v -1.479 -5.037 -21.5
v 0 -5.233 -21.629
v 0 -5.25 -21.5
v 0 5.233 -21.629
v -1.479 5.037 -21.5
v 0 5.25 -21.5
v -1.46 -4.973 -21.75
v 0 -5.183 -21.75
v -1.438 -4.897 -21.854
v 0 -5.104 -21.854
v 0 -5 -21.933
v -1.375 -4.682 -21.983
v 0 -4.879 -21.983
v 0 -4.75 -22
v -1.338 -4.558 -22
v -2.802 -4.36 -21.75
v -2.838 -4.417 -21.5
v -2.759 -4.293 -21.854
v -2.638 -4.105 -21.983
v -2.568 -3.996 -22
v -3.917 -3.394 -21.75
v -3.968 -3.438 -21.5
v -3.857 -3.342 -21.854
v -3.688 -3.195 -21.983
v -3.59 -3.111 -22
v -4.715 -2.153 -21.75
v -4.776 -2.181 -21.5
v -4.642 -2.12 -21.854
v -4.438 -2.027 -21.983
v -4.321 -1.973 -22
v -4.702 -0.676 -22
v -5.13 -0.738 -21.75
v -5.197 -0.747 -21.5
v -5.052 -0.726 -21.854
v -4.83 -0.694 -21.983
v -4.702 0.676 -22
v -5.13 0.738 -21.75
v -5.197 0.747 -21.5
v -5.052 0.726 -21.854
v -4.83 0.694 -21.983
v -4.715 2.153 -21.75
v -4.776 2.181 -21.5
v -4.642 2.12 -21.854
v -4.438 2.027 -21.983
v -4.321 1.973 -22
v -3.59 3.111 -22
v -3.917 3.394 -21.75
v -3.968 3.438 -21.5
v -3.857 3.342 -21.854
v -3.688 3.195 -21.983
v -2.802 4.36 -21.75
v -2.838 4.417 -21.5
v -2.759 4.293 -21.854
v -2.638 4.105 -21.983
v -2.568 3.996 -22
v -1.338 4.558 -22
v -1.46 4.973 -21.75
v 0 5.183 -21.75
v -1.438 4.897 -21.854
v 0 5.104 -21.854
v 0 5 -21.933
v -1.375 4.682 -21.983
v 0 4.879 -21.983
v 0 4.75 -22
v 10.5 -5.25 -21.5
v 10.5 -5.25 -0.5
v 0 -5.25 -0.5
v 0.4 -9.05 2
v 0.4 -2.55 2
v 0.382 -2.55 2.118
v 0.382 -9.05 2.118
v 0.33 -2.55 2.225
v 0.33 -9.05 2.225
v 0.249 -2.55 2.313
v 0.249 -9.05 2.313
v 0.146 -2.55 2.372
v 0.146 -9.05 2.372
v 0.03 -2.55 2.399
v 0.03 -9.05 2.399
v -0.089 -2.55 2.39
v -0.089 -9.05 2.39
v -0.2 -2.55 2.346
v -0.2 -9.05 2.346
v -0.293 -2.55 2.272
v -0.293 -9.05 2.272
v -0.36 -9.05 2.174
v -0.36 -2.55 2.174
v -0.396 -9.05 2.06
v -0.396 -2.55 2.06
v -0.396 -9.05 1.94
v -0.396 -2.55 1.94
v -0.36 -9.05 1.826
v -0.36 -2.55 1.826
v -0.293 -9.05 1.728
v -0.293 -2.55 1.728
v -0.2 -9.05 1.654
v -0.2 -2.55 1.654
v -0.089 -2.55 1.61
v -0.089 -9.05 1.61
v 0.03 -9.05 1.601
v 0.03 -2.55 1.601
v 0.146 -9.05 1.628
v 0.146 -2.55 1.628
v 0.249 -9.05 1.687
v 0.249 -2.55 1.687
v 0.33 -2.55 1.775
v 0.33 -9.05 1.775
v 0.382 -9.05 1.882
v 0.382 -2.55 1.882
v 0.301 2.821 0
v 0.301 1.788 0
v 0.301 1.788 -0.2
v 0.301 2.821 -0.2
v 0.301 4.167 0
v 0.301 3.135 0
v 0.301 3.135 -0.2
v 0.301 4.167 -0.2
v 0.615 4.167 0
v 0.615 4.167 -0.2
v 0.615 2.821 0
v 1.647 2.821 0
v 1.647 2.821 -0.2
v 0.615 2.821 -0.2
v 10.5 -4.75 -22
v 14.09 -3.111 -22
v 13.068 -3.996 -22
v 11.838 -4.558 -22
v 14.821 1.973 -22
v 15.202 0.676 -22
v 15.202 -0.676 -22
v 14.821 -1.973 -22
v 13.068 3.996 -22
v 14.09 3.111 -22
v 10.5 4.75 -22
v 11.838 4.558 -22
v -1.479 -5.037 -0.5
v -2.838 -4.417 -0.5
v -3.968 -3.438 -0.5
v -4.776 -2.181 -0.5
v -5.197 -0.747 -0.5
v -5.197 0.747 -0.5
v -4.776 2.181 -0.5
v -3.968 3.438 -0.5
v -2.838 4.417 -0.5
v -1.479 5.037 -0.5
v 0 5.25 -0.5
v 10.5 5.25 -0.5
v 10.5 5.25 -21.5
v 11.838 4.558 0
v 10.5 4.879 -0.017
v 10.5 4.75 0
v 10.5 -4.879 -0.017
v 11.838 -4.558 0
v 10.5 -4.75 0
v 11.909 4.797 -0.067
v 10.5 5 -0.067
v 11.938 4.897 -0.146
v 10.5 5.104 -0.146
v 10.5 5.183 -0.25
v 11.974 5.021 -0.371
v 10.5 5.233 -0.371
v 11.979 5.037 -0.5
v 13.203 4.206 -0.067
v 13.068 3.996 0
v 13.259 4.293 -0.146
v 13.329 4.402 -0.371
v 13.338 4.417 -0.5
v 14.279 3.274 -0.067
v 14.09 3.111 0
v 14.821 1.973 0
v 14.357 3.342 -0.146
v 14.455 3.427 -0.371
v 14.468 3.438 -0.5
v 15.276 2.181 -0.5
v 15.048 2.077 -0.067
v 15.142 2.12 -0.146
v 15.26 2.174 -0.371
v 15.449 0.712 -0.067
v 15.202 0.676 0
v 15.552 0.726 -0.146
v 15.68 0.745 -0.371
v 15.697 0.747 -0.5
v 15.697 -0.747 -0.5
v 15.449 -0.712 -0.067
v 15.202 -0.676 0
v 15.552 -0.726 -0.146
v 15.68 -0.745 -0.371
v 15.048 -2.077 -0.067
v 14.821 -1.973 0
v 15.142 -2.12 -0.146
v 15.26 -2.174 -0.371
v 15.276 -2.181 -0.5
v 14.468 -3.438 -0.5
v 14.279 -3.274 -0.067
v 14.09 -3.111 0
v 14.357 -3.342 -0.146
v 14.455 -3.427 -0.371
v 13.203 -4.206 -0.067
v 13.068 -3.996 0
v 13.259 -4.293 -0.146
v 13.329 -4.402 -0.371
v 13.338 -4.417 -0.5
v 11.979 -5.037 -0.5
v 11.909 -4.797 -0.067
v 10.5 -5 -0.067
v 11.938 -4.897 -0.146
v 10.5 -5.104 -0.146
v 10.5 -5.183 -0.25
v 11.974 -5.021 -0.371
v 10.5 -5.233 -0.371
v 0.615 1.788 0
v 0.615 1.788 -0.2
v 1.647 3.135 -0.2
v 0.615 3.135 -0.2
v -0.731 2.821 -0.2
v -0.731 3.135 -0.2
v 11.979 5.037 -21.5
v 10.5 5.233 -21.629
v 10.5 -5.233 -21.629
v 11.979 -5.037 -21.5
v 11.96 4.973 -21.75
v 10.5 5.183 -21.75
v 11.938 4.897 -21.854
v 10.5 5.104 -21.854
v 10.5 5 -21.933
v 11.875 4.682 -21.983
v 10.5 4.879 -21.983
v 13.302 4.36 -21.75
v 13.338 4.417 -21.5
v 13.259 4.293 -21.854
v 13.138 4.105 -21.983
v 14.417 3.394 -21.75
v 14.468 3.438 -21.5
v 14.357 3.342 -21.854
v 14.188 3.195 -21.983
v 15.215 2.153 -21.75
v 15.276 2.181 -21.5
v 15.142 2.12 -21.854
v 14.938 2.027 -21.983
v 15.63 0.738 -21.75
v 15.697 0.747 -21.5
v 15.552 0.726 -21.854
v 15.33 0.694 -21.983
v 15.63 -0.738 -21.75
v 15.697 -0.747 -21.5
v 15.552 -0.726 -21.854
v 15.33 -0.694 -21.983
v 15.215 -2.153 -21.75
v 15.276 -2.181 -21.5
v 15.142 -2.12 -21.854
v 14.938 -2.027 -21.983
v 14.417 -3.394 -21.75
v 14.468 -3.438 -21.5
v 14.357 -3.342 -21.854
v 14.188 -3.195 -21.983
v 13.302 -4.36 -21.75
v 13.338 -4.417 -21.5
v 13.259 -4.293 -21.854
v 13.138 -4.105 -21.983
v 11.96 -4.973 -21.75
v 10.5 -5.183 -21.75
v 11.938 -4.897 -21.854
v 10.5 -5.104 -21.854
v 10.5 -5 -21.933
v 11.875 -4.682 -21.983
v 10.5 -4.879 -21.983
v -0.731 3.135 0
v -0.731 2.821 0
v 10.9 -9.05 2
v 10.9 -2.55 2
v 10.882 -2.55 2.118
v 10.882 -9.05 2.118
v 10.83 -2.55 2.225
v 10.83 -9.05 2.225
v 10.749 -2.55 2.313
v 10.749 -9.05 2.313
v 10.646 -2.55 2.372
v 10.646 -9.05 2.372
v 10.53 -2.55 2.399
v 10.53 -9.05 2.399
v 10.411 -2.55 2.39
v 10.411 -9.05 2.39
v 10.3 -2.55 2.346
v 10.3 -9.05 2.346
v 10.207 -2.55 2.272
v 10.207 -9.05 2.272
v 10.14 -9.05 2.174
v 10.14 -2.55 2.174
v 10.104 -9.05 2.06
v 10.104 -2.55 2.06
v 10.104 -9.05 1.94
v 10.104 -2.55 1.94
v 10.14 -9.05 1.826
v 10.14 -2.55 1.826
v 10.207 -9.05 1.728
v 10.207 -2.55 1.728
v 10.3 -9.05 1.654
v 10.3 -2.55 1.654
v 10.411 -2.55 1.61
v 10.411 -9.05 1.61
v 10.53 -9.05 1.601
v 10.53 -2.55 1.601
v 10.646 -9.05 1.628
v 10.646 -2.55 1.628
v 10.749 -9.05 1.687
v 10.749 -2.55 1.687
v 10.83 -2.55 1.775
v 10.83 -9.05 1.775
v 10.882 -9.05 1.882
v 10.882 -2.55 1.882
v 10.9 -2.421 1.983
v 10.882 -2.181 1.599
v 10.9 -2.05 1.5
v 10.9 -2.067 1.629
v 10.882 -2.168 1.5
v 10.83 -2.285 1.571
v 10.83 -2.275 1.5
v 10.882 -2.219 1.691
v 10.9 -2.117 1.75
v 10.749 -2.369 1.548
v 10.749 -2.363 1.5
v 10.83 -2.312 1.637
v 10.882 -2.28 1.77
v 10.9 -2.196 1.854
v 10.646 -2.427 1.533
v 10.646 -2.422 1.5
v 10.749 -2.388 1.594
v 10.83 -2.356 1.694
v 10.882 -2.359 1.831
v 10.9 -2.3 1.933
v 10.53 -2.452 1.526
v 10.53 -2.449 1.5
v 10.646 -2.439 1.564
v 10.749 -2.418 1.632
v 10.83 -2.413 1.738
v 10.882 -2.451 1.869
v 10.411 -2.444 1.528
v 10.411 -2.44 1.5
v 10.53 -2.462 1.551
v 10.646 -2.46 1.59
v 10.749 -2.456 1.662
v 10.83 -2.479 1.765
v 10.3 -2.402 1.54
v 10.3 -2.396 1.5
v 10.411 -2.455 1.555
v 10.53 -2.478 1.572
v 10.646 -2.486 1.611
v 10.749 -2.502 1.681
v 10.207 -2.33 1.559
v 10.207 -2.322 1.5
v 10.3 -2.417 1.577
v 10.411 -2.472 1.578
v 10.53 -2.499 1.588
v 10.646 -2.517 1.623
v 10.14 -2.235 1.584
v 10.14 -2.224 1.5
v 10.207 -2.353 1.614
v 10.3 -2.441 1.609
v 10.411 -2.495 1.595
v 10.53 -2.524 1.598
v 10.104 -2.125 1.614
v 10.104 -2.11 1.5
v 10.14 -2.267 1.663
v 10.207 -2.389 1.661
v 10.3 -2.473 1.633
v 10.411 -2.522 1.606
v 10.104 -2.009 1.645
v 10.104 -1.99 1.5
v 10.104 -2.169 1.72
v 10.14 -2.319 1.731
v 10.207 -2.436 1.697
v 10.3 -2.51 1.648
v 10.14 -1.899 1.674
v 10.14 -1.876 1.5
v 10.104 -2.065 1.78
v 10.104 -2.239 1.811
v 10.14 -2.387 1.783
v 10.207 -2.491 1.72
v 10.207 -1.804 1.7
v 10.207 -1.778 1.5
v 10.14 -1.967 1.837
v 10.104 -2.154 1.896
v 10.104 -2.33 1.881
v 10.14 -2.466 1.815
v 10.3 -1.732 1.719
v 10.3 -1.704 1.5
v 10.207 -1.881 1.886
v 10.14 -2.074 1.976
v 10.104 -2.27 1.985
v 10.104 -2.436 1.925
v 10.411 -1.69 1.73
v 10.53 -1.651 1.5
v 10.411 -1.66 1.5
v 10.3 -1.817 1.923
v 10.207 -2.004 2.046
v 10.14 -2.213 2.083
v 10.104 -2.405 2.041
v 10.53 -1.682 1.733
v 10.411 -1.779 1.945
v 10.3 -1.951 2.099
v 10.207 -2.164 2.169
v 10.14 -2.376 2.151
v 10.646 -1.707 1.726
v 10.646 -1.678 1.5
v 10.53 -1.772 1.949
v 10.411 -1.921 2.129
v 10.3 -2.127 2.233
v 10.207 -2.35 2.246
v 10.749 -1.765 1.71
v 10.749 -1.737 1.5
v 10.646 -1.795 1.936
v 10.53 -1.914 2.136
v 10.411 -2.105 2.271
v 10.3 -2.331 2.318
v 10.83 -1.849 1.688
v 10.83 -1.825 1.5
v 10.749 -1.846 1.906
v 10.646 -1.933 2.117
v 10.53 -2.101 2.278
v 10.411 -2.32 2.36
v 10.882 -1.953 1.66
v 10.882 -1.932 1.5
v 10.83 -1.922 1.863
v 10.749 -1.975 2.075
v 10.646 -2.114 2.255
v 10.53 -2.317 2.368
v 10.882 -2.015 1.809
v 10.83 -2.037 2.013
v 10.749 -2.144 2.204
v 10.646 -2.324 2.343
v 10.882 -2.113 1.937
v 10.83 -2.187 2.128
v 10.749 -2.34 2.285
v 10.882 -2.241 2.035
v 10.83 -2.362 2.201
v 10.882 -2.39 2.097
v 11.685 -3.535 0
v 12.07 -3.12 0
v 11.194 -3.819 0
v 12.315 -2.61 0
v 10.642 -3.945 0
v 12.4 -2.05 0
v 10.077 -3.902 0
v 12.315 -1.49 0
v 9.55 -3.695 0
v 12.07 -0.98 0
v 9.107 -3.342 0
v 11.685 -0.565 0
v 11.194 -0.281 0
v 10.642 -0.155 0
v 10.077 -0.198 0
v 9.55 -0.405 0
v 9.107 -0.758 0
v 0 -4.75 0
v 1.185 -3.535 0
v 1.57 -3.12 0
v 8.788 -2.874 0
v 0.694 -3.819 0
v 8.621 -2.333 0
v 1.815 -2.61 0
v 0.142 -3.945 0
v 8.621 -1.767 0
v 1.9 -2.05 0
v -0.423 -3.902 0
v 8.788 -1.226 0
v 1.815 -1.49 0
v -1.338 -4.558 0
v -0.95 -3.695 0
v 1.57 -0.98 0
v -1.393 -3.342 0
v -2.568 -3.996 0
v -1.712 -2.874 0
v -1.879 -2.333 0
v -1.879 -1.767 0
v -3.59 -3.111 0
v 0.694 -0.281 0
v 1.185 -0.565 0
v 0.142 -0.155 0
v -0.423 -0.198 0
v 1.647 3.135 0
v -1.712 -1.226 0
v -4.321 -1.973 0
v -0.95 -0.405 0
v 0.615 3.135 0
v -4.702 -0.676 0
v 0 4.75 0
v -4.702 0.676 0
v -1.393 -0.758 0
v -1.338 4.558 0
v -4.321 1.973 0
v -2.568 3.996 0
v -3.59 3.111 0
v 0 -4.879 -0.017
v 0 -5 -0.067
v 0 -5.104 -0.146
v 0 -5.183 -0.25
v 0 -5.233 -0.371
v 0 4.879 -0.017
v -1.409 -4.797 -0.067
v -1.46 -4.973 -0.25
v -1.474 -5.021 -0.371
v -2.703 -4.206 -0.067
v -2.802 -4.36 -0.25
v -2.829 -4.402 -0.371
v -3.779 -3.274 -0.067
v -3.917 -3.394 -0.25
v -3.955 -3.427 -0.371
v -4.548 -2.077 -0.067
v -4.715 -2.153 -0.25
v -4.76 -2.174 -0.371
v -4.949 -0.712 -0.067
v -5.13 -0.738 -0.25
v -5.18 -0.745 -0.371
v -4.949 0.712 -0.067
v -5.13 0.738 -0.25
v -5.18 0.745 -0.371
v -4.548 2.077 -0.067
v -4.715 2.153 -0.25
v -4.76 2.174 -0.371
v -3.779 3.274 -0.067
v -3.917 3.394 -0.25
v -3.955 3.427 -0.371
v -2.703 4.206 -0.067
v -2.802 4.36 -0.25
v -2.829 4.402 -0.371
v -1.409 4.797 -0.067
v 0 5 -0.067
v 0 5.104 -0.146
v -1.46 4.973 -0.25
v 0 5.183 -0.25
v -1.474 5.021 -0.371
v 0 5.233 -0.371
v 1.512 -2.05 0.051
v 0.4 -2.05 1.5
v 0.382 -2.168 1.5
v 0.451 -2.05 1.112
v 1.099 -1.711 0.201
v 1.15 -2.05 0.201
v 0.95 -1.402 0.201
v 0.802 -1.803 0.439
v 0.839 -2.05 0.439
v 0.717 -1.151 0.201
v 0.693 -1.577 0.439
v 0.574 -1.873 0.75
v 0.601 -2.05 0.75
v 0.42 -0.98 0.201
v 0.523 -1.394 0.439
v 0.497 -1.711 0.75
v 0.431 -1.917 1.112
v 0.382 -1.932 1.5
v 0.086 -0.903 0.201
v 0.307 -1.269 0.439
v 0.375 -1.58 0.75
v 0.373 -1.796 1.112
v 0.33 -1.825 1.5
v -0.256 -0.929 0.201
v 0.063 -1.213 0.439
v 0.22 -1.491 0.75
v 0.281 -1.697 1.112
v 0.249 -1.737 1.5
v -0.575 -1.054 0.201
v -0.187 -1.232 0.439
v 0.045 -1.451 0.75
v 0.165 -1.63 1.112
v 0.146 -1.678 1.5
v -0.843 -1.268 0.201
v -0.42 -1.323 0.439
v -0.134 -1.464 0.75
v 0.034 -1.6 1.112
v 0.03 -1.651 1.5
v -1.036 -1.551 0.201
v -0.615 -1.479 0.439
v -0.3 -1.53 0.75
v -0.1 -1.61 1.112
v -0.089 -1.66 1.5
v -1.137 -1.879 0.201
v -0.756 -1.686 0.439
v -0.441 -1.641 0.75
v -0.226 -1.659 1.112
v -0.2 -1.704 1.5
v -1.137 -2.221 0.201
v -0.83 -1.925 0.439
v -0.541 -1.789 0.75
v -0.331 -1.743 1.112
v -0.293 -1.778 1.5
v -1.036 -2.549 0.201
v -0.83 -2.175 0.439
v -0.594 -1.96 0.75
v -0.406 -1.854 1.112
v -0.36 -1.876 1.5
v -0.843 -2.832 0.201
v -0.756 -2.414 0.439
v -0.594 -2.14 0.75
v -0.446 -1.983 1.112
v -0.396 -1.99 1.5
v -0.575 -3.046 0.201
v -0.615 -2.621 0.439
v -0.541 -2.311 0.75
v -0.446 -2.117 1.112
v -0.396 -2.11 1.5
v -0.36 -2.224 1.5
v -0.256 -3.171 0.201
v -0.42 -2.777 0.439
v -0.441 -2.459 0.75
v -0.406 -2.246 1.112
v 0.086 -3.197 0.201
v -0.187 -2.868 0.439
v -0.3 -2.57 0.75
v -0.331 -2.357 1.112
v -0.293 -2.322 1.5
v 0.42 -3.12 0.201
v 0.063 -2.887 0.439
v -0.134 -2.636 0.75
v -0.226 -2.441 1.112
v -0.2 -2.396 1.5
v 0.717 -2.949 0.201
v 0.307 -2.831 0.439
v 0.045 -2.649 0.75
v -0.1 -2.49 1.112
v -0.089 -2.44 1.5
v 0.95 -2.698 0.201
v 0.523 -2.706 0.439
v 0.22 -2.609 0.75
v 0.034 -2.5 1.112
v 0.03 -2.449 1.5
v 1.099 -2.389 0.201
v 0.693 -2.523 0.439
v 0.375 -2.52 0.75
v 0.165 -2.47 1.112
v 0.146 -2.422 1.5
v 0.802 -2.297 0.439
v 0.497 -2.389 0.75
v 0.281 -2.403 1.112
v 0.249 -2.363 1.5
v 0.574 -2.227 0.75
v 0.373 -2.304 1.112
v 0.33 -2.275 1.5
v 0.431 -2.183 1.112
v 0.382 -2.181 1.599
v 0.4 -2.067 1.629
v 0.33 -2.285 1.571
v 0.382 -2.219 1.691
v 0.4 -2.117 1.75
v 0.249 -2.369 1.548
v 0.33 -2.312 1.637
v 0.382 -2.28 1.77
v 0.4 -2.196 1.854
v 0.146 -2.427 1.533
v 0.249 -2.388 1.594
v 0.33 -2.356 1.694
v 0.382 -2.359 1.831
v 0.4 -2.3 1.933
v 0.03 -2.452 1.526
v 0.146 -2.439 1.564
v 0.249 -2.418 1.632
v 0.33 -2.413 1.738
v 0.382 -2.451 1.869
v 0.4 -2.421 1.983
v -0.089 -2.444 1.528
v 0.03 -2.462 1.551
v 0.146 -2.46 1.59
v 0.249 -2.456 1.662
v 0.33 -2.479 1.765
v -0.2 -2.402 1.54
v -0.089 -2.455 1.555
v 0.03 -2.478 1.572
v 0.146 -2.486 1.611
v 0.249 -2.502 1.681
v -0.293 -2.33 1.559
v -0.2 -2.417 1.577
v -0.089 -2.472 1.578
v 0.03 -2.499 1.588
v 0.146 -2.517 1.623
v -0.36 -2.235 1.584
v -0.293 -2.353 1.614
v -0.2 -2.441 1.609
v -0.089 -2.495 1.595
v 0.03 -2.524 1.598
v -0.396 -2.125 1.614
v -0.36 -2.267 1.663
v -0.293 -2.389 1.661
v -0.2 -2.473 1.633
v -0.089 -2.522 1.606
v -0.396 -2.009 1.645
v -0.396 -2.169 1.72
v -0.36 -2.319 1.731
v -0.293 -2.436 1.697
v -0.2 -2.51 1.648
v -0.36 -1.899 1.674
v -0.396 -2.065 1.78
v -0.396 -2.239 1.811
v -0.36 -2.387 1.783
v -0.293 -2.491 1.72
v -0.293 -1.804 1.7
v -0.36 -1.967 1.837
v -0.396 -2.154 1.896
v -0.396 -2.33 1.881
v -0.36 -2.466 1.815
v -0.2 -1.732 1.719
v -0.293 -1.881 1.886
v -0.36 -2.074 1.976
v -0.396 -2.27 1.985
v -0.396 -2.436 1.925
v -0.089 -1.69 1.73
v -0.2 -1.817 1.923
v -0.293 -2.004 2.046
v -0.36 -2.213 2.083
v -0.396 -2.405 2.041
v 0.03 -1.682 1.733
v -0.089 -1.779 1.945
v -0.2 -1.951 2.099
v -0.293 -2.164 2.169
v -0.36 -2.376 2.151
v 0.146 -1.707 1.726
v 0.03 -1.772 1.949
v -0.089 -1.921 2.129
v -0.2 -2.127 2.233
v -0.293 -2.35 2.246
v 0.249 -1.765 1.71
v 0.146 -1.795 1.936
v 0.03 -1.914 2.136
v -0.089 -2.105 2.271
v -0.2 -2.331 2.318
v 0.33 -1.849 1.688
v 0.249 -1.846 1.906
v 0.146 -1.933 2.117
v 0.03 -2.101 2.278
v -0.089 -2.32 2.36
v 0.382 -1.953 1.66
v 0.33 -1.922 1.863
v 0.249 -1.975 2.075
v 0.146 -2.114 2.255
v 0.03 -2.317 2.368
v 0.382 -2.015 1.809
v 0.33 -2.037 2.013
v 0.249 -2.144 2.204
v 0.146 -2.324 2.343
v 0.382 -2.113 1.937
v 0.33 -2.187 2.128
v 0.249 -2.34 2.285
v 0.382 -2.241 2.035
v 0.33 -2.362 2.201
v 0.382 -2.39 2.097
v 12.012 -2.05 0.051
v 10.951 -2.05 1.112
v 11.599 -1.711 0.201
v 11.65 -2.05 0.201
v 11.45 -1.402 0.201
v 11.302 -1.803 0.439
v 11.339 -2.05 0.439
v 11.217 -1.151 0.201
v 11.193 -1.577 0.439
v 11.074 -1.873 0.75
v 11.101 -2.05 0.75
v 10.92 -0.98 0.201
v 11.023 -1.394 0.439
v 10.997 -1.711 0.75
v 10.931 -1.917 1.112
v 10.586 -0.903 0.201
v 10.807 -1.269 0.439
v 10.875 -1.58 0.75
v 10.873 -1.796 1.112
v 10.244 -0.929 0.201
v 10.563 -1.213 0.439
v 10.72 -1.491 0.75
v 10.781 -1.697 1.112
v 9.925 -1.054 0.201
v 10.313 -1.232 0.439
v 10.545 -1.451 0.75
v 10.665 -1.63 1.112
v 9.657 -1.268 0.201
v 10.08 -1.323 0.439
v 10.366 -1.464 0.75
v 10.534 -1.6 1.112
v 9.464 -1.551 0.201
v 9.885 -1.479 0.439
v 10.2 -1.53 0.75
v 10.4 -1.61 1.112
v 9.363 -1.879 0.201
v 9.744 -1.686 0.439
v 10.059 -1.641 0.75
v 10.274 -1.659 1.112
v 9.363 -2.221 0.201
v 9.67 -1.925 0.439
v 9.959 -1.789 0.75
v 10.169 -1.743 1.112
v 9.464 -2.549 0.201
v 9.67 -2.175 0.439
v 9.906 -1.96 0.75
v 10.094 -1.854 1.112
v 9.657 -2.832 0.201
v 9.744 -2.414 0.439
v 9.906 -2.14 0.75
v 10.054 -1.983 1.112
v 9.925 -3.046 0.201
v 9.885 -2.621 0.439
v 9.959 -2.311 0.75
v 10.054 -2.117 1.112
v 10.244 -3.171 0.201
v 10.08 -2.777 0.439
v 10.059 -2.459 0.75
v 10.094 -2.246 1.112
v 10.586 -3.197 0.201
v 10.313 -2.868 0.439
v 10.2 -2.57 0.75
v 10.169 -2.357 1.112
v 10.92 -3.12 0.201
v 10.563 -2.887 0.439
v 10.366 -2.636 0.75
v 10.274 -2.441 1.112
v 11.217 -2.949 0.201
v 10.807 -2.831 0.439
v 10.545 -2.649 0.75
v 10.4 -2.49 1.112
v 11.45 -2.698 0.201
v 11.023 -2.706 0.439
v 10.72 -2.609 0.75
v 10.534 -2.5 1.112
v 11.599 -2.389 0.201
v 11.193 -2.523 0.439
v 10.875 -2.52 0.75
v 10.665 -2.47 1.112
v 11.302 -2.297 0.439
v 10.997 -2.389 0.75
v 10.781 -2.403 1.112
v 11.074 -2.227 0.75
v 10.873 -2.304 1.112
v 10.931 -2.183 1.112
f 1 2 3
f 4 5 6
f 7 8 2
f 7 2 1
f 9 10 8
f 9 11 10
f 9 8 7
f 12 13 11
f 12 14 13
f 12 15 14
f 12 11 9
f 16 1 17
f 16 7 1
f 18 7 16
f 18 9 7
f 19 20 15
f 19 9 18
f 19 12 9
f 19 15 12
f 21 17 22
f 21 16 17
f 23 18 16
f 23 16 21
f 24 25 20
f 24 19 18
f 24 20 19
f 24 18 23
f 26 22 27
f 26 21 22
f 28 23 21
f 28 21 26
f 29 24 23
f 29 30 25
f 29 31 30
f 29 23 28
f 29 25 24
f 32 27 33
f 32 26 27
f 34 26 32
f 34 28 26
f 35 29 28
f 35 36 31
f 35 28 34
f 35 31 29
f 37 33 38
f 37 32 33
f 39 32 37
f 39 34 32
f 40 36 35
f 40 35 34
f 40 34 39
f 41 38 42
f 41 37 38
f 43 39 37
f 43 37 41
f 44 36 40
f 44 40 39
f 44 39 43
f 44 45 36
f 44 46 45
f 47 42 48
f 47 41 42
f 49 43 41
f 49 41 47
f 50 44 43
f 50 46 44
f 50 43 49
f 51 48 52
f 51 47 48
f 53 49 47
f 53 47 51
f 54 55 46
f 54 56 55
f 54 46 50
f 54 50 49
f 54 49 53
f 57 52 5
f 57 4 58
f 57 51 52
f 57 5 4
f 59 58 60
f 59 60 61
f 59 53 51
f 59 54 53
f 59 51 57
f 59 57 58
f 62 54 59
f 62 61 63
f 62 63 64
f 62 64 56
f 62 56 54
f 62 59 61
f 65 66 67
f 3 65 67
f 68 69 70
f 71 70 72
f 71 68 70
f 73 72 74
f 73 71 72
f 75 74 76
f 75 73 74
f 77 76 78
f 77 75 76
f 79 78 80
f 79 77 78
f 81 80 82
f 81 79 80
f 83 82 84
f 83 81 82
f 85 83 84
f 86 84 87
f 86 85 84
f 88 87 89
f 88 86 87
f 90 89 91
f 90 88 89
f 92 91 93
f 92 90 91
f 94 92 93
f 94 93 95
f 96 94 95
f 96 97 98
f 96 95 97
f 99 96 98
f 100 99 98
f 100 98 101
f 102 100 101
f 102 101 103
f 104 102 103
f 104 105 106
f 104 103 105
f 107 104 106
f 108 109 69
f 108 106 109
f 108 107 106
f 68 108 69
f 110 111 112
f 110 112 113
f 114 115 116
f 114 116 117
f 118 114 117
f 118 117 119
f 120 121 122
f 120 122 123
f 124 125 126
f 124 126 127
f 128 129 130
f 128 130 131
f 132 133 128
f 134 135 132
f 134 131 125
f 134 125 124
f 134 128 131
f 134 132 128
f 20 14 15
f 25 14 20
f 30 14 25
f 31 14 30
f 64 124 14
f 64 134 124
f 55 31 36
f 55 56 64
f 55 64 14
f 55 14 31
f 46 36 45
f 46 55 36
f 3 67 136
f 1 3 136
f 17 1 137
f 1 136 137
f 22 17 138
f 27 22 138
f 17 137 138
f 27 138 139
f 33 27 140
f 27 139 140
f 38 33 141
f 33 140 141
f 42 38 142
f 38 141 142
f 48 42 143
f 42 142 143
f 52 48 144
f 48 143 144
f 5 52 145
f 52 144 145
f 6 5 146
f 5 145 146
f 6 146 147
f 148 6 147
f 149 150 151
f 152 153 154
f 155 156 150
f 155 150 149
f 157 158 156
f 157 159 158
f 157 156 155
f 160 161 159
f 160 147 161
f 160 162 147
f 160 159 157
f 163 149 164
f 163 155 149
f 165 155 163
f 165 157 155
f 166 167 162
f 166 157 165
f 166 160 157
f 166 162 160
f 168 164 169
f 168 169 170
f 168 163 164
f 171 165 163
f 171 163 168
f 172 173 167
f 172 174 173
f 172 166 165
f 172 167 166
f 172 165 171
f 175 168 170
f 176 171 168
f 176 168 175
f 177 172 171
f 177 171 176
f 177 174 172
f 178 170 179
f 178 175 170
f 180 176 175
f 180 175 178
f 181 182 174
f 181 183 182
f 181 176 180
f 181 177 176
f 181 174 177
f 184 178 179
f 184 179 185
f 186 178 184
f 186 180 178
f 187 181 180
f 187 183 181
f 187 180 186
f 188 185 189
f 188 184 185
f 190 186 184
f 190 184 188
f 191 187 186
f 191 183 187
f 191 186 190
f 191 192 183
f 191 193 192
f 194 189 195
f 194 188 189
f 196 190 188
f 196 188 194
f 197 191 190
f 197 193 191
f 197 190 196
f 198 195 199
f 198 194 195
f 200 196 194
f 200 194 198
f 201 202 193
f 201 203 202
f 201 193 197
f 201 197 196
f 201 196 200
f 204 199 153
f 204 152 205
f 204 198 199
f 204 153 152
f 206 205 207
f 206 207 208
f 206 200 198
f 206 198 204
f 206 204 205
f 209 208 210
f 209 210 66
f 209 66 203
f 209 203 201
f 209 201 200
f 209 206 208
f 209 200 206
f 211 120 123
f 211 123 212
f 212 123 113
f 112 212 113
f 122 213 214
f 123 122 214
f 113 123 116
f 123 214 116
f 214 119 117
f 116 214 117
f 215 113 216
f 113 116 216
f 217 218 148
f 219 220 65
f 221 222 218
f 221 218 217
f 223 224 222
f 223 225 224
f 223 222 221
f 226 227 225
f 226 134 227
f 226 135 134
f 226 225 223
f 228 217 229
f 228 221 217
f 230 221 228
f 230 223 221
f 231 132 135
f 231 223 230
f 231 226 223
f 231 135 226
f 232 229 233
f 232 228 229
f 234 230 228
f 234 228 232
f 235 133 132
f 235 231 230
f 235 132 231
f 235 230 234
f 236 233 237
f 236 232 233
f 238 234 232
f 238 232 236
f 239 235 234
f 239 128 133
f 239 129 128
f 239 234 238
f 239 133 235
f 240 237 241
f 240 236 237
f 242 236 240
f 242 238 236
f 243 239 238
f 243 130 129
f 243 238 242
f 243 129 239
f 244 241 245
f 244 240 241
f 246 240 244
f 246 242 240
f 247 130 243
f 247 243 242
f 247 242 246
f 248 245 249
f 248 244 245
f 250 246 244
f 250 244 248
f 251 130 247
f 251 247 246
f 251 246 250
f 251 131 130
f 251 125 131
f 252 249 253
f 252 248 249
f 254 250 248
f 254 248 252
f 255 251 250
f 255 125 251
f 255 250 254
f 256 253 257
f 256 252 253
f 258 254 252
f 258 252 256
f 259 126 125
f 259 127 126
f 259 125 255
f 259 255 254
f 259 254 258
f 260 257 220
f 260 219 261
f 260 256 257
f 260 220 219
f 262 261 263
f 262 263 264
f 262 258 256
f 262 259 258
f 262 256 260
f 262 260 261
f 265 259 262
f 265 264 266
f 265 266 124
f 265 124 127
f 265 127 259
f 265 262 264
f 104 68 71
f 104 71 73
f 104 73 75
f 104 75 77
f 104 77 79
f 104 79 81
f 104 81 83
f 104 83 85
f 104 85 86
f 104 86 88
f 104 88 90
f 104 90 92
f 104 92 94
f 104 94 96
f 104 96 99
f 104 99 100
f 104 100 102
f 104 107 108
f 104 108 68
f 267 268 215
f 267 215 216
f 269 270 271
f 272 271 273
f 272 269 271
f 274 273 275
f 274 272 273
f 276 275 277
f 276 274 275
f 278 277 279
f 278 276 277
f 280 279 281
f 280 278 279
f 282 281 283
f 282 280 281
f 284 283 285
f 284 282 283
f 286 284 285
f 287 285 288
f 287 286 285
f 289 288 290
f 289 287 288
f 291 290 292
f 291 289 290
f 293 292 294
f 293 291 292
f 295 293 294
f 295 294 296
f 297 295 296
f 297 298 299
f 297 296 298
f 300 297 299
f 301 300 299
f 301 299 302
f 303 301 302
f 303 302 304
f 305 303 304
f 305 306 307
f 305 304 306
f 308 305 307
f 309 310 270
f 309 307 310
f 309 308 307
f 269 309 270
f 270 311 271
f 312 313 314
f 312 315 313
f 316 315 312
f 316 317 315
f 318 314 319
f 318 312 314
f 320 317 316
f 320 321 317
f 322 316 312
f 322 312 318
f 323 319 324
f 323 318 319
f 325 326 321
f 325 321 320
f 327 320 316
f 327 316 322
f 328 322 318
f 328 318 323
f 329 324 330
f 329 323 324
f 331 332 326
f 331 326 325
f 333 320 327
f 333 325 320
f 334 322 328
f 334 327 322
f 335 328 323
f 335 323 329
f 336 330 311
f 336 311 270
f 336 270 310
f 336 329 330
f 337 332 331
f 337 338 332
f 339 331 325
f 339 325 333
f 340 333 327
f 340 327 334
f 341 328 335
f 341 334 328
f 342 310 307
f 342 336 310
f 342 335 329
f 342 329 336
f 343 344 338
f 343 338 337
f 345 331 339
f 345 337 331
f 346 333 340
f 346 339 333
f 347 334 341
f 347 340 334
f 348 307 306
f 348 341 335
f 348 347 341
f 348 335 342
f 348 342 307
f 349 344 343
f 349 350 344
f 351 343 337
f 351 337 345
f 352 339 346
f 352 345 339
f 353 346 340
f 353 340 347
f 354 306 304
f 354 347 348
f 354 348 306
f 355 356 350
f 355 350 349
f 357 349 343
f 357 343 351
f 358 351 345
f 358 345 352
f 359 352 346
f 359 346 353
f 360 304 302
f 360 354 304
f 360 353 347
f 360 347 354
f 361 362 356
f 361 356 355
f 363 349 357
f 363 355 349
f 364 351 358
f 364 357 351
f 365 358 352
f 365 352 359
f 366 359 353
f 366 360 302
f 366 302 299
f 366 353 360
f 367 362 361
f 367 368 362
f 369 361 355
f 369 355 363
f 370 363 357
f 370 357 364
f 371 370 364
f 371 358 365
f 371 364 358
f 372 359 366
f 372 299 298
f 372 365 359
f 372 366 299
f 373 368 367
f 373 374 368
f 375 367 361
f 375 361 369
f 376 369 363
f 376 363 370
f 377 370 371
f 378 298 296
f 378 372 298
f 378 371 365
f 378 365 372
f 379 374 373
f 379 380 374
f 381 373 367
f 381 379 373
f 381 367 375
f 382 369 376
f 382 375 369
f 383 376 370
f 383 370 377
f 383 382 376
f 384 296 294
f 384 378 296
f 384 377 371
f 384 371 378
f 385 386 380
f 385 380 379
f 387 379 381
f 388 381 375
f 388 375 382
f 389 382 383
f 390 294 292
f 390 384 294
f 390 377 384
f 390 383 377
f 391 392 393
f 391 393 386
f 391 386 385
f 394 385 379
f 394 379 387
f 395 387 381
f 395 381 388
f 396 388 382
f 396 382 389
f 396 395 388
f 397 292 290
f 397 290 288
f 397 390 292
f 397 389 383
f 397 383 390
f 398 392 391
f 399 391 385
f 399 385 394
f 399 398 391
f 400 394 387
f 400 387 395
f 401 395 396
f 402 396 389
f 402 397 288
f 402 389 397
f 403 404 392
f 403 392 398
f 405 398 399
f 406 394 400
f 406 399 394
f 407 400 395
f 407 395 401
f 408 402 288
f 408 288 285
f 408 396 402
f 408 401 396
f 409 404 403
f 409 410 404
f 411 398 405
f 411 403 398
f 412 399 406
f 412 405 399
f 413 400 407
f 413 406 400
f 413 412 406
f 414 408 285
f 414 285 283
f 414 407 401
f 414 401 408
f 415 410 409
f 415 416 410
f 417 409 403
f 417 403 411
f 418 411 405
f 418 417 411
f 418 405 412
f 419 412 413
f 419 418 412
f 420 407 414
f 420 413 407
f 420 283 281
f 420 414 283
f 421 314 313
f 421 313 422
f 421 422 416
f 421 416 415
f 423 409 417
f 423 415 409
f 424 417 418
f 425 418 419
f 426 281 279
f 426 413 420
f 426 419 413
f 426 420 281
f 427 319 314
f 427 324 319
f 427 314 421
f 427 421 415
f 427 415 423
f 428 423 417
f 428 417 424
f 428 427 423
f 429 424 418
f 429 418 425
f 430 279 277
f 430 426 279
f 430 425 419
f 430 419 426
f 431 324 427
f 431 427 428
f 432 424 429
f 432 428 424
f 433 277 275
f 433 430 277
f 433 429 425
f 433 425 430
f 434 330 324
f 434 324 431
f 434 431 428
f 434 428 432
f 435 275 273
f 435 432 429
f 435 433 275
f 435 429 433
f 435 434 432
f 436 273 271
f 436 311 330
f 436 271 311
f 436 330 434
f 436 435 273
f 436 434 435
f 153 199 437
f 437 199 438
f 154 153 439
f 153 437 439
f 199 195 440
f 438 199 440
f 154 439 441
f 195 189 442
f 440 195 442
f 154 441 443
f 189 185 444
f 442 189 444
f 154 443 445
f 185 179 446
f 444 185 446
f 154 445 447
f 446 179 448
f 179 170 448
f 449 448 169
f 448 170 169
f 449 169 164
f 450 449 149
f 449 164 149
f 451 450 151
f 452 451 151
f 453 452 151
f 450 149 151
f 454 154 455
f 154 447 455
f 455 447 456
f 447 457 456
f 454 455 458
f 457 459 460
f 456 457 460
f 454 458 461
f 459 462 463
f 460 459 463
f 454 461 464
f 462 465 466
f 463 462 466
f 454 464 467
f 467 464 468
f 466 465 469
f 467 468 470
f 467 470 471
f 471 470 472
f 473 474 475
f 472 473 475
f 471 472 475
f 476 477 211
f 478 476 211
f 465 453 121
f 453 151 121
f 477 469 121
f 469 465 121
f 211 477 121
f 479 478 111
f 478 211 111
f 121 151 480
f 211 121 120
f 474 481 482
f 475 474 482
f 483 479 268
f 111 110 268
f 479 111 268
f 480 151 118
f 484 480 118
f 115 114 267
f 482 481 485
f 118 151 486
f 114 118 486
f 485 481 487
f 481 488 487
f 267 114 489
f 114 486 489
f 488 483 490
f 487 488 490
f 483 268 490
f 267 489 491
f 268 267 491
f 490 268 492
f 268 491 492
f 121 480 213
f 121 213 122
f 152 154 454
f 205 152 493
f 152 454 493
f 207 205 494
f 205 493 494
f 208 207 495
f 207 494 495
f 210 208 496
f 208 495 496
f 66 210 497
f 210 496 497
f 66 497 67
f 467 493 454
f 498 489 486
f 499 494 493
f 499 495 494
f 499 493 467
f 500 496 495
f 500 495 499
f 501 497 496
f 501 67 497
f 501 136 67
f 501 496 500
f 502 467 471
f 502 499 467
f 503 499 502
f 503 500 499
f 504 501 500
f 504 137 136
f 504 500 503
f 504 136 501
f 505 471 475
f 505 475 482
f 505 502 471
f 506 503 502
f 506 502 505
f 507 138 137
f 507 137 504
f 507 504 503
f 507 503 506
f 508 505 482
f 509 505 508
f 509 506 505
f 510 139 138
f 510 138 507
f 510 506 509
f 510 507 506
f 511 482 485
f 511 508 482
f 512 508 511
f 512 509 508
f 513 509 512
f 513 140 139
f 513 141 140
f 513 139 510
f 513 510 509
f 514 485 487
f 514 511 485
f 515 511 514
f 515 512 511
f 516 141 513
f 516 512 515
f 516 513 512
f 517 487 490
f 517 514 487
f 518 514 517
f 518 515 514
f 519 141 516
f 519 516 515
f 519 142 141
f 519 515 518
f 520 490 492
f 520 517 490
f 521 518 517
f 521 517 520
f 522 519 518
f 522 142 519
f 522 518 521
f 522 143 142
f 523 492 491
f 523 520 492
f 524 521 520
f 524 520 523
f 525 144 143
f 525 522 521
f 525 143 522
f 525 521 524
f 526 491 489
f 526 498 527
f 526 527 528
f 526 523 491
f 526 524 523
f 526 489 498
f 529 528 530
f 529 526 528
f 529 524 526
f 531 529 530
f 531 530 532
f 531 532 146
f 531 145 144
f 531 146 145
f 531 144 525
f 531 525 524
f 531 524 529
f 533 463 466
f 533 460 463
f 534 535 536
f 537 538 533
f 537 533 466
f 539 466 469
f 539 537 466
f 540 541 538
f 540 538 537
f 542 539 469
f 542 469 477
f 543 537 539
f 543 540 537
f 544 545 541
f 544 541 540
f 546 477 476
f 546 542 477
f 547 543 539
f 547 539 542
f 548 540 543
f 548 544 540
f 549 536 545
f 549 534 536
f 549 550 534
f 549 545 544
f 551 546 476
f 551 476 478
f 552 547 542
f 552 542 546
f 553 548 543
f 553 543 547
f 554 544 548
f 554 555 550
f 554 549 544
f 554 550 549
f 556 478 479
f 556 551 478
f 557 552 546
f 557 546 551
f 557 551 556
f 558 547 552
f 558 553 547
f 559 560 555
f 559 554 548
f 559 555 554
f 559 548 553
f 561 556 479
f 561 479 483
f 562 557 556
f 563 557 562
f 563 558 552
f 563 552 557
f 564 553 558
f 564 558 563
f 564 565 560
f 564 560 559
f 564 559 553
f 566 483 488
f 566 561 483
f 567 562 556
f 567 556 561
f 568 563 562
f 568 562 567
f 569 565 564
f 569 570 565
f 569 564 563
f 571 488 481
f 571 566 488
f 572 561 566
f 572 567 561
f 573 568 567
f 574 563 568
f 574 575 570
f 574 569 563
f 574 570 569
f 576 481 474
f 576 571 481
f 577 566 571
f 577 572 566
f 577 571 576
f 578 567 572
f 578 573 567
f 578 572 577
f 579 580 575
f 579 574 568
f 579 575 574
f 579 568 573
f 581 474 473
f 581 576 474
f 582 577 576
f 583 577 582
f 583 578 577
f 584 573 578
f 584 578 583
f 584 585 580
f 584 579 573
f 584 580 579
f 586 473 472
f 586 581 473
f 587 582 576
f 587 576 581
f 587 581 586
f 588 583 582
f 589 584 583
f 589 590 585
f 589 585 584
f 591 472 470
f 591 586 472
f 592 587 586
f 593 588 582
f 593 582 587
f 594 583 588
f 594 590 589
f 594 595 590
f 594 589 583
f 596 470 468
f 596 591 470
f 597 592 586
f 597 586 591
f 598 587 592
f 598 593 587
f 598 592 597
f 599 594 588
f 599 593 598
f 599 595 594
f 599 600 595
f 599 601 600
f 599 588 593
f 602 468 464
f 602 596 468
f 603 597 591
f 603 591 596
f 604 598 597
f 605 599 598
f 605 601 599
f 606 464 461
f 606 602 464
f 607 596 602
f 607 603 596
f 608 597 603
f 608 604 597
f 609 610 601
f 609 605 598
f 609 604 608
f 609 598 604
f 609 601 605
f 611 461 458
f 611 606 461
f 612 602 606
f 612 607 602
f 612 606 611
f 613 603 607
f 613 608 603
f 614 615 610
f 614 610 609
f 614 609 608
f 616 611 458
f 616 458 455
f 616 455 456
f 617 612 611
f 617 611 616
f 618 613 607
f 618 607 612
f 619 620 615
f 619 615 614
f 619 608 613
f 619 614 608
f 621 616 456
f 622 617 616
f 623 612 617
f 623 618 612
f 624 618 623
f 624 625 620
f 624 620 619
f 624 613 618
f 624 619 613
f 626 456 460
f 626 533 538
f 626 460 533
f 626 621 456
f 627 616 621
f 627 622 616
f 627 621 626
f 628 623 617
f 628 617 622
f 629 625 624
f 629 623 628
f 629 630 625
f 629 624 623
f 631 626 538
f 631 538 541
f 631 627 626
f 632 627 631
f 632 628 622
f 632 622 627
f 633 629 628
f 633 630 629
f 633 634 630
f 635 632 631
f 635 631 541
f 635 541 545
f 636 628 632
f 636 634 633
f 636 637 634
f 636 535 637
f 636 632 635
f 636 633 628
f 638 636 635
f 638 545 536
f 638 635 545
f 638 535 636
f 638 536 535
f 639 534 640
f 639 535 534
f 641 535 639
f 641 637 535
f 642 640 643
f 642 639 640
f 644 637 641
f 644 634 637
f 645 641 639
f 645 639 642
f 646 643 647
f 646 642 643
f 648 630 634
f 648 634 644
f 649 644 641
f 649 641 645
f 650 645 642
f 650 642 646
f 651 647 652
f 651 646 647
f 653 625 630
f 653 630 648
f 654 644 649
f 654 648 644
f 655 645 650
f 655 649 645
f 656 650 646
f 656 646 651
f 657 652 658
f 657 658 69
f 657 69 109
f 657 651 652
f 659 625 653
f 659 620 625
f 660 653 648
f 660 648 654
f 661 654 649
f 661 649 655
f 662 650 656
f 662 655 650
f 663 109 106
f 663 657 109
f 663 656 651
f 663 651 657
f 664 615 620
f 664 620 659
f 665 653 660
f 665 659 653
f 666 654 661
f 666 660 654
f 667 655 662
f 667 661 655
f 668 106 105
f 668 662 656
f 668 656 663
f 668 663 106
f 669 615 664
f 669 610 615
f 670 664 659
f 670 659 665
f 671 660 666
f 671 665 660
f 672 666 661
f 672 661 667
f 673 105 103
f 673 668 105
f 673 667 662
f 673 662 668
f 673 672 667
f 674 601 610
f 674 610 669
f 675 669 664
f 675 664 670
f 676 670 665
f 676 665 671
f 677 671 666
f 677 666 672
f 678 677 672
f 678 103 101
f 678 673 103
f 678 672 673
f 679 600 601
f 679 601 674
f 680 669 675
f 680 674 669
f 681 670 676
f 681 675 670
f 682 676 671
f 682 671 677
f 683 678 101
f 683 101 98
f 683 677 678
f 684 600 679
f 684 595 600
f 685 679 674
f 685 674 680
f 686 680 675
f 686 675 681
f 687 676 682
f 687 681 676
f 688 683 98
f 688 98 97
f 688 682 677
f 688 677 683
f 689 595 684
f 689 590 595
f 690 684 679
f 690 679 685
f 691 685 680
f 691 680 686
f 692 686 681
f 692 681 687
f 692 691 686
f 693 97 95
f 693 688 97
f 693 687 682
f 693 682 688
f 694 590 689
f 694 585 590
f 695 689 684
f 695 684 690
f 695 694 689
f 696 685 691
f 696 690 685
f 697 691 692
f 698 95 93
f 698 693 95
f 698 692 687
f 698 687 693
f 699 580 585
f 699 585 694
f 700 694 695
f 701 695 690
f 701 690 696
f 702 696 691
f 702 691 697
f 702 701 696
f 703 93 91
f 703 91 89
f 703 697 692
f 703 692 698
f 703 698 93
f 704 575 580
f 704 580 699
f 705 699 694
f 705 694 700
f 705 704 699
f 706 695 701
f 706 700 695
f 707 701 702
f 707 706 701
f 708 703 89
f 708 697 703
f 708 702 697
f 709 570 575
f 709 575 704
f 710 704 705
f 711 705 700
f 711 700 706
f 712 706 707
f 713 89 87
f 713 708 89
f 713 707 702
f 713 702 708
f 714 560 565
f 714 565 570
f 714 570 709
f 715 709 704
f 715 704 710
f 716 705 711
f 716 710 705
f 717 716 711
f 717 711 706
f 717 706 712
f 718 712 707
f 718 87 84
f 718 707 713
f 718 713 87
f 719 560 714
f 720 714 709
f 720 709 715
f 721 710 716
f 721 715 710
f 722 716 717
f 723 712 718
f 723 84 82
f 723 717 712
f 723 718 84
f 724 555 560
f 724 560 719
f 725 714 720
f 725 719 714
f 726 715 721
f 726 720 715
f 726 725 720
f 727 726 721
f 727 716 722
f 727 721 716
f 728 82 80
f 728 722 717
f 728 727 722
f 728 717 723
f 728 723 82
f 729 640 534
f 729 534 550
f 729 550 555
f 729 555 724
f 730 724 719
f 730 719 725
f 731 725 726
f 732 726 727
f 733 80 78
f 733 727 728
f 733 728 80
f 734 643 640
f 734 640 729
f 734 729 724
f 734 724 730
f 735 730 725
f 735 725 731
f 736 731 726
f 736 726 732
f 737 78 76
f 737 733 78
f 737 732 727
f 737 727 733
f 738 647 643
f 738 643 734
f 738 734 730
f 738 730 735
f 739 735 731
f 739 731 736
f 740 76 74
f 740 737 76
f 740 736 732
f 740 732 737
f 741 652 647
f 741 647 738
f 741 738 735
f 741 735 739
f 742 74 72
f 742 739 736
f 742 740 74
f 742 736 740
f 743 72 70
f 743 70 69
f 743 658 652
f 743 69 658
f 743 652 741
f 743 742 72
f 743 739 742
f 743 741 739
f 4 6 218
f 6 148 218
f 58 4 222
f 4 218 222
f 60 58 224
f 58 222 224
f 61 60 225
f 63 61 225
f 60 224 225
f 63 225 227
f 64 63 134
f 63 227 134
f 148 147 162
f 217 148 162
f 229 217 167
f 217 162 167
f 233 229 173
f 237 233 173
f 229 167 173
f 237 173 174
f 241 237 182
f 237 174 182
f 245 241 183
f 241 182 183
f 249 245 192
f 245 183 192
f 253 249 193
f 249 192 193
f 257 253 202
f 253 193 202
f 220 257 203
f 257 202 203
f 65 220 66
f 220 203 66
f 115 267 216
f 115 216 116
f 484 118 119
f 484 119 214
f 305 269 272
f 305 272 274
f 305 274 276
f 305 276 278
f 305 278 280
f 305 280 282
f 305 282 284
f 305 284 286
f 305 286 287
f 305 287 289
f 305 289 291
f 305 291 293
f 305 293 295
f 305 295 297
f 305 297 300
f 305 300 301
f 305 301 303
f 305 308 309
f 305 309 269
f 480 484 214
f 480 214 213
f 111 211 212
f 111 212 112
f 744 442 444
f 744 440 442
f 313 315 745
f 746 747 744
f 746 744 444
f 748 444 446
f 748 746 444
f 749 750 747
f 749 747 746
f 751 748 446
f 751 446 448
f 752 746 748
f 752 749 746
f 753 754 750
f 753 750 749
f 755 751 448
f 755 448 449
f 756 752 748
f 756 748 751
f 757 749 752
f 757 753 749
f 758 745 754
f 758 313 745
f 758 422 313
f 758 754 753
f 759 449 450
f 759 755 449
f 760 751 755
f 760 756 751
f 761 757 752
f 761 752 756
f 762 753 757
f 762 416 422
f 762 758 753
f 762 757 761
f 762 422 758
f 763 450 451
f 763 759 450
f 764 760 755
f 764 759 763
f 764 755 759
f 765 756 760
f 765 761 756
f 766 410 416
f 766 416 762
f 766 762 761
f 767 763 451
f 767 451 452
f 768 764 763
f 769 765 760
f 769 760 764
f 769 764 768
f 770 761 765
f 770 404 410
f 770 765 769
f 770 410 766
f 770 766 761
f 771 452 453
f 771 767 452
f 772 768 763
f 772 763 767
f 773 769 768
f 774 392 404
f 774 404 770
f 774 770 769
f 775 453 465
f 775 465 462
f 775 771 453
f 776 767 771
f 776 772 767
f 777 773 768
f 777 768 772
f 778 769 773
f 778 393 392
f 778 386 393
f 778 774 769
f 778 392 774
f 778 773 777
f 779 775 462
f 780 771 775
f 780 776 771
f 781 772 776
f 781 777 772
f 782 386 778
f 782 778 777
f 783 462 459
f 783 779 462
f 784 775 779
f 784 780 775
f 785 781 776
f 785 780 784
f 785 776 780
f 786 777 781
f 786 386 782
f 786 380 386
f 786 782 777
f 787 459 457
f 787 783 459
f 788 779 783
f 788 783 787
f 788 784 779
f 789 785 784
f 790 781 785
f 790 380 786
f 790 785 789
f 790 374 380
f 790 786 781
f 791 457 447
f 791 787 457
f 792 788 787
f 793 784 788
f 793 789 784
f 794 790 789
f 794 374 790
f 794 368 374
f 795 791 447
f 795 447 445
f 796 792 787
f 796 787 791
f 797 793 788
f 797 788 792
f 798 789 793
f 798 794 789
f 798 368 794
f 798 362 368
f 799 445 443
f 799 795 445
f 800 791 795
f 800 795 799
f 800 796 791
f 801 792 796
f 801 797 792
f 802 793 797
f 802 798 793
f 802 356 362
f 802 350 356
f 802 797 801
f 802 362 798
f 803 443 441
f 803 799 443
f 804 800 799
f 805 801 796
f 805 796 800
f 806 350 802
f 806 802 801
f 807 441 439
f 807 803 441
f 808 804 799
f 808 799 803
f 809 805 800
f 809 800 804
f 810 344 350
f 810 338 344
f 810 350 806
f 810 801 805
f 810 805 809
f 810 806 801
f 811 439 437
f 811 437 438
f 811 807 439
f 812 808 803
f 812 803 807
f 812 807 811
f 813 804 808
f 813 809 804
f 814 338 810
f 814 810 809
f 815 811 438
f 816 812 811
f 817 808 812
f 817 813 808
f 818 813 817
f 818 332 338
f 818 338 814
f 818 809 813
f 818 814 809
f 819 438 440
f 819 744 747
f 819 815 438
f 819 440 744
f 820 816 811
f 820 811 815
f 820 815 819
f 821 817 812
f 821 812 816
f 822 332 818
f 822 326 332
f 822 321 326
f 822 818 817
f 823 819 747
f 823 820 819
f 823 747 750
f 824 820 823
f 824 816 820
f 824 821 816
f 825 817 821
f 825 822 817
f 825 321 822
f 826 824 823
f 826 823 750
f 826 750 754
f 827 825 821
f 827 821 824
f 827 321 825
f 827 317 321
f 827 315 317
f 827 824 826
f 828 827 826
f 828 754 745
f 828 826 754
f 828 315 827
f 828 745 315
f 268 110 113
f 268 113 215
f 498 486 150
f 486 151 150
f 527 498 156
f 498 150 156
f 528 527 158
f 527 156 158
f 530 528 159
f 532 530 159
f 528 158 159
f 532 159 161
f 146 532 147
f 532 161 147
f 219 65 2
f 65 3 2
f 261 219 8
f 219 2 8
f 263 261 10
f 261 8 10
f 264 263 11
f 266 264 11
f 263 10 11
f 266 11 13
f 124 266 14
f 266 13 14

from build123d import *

# Parameters (mm, degrees)
BOSS_EXTRUDE1_DEPTH = 22
SKETCH2_R           = 0.4
FILLET1_R           = 1.5
FILLET2_R           = 0.5
CUT_EXTRUDE1_DEPTH  = 0.2


with BuildPart() as part:
    # Sketch1 → Boss-Extrude1 (new body)
    with BuildSketch(Plane.XY):
        with BuildLine():
            Line((0, 5.25), (10.5, 5.25))
            ThreePointArc((10.5, 5.25), (15.75, 0), (10.5, -5.25))
            Line((10.5, -5.25), (0, -5.25))
            ThreePointArc((0, -5.25), (-5.25, 0), (0, 5.25))
        make_face()
    extrude(amount=-BOSS_EXTRUDE1_DEPTH)

    # Sweep1: sweep along a path in Sketch3
    with BuildLine(Plane.YZ) as sweep1_path:
        Line((-2.05, 0), (-2.05, 1.5))
        ThreePointArc((-2.05, 1.5), (-2.196446609, 1.853553391), (-2.55, 2))
        Line((-2.55, 2), (-9.05, 2))
    # Sketch2 → Sweep1 (sweep)
    with BuildSketch(Plane.XY):
        with Locations((0, -2.05)):
            Circle(SKETCH2_R)
        with Locations((10.5, -2.05)):
            Circle(SKETCH2_R)
    sweep(path=sweep1_path.line)

    # Fillet1
    fillet1_edges = [part.edges().sort_by_distance(p)[0] for p in [
        (-0.4, -2.05, 0),
        (10.1, -2.05, 0),
    ]]
    fillet(fillet1_edges, radius=FILLET1_R - 0.0001)  # a hair under: the kernel refuses the full size

    # Fillet2
    fillet2_edges = [part.edges().sort_by_distance(p)[0] for p in [
        (15.75, 0, -22),
        (5.25, 5.25, -22),
        (-5.25, 0, -22),
        (5.25, 5.25, 0),
        (15.75, 0, 0),
        (5.25, -5.25, 0),
        (-5.25, 0, 0),
        (5.25, -5.25, -22),
    ]]
    fillet(fillet2_edges, radius=FILLET2_R)

    # Sketch4 → Cut-Extrude1 (cut)
    with BuildSketch(Plane.XY):
        Polygon((0.301282051, 3.134615385), (0.301282051, 4.166666667), (0.615384615, 4.166666667), (0.615384615, 3.134615385), (1.647435897, 3.134615385), (1.647435897, 2.820512821), (0.615384615, 2.820512821), (0.615384615, 1.788461538), (0.301282051, 1.788461538), (0.301282051, 2.820512821), (-0.730769231, 2.820512821), (-0.730769231, 3.134615385), align=None)
    extrude(amount=-CUT_EXTRUDE1_DEPTH, mode=Mode.SUBTRACT)


solid = part.part
